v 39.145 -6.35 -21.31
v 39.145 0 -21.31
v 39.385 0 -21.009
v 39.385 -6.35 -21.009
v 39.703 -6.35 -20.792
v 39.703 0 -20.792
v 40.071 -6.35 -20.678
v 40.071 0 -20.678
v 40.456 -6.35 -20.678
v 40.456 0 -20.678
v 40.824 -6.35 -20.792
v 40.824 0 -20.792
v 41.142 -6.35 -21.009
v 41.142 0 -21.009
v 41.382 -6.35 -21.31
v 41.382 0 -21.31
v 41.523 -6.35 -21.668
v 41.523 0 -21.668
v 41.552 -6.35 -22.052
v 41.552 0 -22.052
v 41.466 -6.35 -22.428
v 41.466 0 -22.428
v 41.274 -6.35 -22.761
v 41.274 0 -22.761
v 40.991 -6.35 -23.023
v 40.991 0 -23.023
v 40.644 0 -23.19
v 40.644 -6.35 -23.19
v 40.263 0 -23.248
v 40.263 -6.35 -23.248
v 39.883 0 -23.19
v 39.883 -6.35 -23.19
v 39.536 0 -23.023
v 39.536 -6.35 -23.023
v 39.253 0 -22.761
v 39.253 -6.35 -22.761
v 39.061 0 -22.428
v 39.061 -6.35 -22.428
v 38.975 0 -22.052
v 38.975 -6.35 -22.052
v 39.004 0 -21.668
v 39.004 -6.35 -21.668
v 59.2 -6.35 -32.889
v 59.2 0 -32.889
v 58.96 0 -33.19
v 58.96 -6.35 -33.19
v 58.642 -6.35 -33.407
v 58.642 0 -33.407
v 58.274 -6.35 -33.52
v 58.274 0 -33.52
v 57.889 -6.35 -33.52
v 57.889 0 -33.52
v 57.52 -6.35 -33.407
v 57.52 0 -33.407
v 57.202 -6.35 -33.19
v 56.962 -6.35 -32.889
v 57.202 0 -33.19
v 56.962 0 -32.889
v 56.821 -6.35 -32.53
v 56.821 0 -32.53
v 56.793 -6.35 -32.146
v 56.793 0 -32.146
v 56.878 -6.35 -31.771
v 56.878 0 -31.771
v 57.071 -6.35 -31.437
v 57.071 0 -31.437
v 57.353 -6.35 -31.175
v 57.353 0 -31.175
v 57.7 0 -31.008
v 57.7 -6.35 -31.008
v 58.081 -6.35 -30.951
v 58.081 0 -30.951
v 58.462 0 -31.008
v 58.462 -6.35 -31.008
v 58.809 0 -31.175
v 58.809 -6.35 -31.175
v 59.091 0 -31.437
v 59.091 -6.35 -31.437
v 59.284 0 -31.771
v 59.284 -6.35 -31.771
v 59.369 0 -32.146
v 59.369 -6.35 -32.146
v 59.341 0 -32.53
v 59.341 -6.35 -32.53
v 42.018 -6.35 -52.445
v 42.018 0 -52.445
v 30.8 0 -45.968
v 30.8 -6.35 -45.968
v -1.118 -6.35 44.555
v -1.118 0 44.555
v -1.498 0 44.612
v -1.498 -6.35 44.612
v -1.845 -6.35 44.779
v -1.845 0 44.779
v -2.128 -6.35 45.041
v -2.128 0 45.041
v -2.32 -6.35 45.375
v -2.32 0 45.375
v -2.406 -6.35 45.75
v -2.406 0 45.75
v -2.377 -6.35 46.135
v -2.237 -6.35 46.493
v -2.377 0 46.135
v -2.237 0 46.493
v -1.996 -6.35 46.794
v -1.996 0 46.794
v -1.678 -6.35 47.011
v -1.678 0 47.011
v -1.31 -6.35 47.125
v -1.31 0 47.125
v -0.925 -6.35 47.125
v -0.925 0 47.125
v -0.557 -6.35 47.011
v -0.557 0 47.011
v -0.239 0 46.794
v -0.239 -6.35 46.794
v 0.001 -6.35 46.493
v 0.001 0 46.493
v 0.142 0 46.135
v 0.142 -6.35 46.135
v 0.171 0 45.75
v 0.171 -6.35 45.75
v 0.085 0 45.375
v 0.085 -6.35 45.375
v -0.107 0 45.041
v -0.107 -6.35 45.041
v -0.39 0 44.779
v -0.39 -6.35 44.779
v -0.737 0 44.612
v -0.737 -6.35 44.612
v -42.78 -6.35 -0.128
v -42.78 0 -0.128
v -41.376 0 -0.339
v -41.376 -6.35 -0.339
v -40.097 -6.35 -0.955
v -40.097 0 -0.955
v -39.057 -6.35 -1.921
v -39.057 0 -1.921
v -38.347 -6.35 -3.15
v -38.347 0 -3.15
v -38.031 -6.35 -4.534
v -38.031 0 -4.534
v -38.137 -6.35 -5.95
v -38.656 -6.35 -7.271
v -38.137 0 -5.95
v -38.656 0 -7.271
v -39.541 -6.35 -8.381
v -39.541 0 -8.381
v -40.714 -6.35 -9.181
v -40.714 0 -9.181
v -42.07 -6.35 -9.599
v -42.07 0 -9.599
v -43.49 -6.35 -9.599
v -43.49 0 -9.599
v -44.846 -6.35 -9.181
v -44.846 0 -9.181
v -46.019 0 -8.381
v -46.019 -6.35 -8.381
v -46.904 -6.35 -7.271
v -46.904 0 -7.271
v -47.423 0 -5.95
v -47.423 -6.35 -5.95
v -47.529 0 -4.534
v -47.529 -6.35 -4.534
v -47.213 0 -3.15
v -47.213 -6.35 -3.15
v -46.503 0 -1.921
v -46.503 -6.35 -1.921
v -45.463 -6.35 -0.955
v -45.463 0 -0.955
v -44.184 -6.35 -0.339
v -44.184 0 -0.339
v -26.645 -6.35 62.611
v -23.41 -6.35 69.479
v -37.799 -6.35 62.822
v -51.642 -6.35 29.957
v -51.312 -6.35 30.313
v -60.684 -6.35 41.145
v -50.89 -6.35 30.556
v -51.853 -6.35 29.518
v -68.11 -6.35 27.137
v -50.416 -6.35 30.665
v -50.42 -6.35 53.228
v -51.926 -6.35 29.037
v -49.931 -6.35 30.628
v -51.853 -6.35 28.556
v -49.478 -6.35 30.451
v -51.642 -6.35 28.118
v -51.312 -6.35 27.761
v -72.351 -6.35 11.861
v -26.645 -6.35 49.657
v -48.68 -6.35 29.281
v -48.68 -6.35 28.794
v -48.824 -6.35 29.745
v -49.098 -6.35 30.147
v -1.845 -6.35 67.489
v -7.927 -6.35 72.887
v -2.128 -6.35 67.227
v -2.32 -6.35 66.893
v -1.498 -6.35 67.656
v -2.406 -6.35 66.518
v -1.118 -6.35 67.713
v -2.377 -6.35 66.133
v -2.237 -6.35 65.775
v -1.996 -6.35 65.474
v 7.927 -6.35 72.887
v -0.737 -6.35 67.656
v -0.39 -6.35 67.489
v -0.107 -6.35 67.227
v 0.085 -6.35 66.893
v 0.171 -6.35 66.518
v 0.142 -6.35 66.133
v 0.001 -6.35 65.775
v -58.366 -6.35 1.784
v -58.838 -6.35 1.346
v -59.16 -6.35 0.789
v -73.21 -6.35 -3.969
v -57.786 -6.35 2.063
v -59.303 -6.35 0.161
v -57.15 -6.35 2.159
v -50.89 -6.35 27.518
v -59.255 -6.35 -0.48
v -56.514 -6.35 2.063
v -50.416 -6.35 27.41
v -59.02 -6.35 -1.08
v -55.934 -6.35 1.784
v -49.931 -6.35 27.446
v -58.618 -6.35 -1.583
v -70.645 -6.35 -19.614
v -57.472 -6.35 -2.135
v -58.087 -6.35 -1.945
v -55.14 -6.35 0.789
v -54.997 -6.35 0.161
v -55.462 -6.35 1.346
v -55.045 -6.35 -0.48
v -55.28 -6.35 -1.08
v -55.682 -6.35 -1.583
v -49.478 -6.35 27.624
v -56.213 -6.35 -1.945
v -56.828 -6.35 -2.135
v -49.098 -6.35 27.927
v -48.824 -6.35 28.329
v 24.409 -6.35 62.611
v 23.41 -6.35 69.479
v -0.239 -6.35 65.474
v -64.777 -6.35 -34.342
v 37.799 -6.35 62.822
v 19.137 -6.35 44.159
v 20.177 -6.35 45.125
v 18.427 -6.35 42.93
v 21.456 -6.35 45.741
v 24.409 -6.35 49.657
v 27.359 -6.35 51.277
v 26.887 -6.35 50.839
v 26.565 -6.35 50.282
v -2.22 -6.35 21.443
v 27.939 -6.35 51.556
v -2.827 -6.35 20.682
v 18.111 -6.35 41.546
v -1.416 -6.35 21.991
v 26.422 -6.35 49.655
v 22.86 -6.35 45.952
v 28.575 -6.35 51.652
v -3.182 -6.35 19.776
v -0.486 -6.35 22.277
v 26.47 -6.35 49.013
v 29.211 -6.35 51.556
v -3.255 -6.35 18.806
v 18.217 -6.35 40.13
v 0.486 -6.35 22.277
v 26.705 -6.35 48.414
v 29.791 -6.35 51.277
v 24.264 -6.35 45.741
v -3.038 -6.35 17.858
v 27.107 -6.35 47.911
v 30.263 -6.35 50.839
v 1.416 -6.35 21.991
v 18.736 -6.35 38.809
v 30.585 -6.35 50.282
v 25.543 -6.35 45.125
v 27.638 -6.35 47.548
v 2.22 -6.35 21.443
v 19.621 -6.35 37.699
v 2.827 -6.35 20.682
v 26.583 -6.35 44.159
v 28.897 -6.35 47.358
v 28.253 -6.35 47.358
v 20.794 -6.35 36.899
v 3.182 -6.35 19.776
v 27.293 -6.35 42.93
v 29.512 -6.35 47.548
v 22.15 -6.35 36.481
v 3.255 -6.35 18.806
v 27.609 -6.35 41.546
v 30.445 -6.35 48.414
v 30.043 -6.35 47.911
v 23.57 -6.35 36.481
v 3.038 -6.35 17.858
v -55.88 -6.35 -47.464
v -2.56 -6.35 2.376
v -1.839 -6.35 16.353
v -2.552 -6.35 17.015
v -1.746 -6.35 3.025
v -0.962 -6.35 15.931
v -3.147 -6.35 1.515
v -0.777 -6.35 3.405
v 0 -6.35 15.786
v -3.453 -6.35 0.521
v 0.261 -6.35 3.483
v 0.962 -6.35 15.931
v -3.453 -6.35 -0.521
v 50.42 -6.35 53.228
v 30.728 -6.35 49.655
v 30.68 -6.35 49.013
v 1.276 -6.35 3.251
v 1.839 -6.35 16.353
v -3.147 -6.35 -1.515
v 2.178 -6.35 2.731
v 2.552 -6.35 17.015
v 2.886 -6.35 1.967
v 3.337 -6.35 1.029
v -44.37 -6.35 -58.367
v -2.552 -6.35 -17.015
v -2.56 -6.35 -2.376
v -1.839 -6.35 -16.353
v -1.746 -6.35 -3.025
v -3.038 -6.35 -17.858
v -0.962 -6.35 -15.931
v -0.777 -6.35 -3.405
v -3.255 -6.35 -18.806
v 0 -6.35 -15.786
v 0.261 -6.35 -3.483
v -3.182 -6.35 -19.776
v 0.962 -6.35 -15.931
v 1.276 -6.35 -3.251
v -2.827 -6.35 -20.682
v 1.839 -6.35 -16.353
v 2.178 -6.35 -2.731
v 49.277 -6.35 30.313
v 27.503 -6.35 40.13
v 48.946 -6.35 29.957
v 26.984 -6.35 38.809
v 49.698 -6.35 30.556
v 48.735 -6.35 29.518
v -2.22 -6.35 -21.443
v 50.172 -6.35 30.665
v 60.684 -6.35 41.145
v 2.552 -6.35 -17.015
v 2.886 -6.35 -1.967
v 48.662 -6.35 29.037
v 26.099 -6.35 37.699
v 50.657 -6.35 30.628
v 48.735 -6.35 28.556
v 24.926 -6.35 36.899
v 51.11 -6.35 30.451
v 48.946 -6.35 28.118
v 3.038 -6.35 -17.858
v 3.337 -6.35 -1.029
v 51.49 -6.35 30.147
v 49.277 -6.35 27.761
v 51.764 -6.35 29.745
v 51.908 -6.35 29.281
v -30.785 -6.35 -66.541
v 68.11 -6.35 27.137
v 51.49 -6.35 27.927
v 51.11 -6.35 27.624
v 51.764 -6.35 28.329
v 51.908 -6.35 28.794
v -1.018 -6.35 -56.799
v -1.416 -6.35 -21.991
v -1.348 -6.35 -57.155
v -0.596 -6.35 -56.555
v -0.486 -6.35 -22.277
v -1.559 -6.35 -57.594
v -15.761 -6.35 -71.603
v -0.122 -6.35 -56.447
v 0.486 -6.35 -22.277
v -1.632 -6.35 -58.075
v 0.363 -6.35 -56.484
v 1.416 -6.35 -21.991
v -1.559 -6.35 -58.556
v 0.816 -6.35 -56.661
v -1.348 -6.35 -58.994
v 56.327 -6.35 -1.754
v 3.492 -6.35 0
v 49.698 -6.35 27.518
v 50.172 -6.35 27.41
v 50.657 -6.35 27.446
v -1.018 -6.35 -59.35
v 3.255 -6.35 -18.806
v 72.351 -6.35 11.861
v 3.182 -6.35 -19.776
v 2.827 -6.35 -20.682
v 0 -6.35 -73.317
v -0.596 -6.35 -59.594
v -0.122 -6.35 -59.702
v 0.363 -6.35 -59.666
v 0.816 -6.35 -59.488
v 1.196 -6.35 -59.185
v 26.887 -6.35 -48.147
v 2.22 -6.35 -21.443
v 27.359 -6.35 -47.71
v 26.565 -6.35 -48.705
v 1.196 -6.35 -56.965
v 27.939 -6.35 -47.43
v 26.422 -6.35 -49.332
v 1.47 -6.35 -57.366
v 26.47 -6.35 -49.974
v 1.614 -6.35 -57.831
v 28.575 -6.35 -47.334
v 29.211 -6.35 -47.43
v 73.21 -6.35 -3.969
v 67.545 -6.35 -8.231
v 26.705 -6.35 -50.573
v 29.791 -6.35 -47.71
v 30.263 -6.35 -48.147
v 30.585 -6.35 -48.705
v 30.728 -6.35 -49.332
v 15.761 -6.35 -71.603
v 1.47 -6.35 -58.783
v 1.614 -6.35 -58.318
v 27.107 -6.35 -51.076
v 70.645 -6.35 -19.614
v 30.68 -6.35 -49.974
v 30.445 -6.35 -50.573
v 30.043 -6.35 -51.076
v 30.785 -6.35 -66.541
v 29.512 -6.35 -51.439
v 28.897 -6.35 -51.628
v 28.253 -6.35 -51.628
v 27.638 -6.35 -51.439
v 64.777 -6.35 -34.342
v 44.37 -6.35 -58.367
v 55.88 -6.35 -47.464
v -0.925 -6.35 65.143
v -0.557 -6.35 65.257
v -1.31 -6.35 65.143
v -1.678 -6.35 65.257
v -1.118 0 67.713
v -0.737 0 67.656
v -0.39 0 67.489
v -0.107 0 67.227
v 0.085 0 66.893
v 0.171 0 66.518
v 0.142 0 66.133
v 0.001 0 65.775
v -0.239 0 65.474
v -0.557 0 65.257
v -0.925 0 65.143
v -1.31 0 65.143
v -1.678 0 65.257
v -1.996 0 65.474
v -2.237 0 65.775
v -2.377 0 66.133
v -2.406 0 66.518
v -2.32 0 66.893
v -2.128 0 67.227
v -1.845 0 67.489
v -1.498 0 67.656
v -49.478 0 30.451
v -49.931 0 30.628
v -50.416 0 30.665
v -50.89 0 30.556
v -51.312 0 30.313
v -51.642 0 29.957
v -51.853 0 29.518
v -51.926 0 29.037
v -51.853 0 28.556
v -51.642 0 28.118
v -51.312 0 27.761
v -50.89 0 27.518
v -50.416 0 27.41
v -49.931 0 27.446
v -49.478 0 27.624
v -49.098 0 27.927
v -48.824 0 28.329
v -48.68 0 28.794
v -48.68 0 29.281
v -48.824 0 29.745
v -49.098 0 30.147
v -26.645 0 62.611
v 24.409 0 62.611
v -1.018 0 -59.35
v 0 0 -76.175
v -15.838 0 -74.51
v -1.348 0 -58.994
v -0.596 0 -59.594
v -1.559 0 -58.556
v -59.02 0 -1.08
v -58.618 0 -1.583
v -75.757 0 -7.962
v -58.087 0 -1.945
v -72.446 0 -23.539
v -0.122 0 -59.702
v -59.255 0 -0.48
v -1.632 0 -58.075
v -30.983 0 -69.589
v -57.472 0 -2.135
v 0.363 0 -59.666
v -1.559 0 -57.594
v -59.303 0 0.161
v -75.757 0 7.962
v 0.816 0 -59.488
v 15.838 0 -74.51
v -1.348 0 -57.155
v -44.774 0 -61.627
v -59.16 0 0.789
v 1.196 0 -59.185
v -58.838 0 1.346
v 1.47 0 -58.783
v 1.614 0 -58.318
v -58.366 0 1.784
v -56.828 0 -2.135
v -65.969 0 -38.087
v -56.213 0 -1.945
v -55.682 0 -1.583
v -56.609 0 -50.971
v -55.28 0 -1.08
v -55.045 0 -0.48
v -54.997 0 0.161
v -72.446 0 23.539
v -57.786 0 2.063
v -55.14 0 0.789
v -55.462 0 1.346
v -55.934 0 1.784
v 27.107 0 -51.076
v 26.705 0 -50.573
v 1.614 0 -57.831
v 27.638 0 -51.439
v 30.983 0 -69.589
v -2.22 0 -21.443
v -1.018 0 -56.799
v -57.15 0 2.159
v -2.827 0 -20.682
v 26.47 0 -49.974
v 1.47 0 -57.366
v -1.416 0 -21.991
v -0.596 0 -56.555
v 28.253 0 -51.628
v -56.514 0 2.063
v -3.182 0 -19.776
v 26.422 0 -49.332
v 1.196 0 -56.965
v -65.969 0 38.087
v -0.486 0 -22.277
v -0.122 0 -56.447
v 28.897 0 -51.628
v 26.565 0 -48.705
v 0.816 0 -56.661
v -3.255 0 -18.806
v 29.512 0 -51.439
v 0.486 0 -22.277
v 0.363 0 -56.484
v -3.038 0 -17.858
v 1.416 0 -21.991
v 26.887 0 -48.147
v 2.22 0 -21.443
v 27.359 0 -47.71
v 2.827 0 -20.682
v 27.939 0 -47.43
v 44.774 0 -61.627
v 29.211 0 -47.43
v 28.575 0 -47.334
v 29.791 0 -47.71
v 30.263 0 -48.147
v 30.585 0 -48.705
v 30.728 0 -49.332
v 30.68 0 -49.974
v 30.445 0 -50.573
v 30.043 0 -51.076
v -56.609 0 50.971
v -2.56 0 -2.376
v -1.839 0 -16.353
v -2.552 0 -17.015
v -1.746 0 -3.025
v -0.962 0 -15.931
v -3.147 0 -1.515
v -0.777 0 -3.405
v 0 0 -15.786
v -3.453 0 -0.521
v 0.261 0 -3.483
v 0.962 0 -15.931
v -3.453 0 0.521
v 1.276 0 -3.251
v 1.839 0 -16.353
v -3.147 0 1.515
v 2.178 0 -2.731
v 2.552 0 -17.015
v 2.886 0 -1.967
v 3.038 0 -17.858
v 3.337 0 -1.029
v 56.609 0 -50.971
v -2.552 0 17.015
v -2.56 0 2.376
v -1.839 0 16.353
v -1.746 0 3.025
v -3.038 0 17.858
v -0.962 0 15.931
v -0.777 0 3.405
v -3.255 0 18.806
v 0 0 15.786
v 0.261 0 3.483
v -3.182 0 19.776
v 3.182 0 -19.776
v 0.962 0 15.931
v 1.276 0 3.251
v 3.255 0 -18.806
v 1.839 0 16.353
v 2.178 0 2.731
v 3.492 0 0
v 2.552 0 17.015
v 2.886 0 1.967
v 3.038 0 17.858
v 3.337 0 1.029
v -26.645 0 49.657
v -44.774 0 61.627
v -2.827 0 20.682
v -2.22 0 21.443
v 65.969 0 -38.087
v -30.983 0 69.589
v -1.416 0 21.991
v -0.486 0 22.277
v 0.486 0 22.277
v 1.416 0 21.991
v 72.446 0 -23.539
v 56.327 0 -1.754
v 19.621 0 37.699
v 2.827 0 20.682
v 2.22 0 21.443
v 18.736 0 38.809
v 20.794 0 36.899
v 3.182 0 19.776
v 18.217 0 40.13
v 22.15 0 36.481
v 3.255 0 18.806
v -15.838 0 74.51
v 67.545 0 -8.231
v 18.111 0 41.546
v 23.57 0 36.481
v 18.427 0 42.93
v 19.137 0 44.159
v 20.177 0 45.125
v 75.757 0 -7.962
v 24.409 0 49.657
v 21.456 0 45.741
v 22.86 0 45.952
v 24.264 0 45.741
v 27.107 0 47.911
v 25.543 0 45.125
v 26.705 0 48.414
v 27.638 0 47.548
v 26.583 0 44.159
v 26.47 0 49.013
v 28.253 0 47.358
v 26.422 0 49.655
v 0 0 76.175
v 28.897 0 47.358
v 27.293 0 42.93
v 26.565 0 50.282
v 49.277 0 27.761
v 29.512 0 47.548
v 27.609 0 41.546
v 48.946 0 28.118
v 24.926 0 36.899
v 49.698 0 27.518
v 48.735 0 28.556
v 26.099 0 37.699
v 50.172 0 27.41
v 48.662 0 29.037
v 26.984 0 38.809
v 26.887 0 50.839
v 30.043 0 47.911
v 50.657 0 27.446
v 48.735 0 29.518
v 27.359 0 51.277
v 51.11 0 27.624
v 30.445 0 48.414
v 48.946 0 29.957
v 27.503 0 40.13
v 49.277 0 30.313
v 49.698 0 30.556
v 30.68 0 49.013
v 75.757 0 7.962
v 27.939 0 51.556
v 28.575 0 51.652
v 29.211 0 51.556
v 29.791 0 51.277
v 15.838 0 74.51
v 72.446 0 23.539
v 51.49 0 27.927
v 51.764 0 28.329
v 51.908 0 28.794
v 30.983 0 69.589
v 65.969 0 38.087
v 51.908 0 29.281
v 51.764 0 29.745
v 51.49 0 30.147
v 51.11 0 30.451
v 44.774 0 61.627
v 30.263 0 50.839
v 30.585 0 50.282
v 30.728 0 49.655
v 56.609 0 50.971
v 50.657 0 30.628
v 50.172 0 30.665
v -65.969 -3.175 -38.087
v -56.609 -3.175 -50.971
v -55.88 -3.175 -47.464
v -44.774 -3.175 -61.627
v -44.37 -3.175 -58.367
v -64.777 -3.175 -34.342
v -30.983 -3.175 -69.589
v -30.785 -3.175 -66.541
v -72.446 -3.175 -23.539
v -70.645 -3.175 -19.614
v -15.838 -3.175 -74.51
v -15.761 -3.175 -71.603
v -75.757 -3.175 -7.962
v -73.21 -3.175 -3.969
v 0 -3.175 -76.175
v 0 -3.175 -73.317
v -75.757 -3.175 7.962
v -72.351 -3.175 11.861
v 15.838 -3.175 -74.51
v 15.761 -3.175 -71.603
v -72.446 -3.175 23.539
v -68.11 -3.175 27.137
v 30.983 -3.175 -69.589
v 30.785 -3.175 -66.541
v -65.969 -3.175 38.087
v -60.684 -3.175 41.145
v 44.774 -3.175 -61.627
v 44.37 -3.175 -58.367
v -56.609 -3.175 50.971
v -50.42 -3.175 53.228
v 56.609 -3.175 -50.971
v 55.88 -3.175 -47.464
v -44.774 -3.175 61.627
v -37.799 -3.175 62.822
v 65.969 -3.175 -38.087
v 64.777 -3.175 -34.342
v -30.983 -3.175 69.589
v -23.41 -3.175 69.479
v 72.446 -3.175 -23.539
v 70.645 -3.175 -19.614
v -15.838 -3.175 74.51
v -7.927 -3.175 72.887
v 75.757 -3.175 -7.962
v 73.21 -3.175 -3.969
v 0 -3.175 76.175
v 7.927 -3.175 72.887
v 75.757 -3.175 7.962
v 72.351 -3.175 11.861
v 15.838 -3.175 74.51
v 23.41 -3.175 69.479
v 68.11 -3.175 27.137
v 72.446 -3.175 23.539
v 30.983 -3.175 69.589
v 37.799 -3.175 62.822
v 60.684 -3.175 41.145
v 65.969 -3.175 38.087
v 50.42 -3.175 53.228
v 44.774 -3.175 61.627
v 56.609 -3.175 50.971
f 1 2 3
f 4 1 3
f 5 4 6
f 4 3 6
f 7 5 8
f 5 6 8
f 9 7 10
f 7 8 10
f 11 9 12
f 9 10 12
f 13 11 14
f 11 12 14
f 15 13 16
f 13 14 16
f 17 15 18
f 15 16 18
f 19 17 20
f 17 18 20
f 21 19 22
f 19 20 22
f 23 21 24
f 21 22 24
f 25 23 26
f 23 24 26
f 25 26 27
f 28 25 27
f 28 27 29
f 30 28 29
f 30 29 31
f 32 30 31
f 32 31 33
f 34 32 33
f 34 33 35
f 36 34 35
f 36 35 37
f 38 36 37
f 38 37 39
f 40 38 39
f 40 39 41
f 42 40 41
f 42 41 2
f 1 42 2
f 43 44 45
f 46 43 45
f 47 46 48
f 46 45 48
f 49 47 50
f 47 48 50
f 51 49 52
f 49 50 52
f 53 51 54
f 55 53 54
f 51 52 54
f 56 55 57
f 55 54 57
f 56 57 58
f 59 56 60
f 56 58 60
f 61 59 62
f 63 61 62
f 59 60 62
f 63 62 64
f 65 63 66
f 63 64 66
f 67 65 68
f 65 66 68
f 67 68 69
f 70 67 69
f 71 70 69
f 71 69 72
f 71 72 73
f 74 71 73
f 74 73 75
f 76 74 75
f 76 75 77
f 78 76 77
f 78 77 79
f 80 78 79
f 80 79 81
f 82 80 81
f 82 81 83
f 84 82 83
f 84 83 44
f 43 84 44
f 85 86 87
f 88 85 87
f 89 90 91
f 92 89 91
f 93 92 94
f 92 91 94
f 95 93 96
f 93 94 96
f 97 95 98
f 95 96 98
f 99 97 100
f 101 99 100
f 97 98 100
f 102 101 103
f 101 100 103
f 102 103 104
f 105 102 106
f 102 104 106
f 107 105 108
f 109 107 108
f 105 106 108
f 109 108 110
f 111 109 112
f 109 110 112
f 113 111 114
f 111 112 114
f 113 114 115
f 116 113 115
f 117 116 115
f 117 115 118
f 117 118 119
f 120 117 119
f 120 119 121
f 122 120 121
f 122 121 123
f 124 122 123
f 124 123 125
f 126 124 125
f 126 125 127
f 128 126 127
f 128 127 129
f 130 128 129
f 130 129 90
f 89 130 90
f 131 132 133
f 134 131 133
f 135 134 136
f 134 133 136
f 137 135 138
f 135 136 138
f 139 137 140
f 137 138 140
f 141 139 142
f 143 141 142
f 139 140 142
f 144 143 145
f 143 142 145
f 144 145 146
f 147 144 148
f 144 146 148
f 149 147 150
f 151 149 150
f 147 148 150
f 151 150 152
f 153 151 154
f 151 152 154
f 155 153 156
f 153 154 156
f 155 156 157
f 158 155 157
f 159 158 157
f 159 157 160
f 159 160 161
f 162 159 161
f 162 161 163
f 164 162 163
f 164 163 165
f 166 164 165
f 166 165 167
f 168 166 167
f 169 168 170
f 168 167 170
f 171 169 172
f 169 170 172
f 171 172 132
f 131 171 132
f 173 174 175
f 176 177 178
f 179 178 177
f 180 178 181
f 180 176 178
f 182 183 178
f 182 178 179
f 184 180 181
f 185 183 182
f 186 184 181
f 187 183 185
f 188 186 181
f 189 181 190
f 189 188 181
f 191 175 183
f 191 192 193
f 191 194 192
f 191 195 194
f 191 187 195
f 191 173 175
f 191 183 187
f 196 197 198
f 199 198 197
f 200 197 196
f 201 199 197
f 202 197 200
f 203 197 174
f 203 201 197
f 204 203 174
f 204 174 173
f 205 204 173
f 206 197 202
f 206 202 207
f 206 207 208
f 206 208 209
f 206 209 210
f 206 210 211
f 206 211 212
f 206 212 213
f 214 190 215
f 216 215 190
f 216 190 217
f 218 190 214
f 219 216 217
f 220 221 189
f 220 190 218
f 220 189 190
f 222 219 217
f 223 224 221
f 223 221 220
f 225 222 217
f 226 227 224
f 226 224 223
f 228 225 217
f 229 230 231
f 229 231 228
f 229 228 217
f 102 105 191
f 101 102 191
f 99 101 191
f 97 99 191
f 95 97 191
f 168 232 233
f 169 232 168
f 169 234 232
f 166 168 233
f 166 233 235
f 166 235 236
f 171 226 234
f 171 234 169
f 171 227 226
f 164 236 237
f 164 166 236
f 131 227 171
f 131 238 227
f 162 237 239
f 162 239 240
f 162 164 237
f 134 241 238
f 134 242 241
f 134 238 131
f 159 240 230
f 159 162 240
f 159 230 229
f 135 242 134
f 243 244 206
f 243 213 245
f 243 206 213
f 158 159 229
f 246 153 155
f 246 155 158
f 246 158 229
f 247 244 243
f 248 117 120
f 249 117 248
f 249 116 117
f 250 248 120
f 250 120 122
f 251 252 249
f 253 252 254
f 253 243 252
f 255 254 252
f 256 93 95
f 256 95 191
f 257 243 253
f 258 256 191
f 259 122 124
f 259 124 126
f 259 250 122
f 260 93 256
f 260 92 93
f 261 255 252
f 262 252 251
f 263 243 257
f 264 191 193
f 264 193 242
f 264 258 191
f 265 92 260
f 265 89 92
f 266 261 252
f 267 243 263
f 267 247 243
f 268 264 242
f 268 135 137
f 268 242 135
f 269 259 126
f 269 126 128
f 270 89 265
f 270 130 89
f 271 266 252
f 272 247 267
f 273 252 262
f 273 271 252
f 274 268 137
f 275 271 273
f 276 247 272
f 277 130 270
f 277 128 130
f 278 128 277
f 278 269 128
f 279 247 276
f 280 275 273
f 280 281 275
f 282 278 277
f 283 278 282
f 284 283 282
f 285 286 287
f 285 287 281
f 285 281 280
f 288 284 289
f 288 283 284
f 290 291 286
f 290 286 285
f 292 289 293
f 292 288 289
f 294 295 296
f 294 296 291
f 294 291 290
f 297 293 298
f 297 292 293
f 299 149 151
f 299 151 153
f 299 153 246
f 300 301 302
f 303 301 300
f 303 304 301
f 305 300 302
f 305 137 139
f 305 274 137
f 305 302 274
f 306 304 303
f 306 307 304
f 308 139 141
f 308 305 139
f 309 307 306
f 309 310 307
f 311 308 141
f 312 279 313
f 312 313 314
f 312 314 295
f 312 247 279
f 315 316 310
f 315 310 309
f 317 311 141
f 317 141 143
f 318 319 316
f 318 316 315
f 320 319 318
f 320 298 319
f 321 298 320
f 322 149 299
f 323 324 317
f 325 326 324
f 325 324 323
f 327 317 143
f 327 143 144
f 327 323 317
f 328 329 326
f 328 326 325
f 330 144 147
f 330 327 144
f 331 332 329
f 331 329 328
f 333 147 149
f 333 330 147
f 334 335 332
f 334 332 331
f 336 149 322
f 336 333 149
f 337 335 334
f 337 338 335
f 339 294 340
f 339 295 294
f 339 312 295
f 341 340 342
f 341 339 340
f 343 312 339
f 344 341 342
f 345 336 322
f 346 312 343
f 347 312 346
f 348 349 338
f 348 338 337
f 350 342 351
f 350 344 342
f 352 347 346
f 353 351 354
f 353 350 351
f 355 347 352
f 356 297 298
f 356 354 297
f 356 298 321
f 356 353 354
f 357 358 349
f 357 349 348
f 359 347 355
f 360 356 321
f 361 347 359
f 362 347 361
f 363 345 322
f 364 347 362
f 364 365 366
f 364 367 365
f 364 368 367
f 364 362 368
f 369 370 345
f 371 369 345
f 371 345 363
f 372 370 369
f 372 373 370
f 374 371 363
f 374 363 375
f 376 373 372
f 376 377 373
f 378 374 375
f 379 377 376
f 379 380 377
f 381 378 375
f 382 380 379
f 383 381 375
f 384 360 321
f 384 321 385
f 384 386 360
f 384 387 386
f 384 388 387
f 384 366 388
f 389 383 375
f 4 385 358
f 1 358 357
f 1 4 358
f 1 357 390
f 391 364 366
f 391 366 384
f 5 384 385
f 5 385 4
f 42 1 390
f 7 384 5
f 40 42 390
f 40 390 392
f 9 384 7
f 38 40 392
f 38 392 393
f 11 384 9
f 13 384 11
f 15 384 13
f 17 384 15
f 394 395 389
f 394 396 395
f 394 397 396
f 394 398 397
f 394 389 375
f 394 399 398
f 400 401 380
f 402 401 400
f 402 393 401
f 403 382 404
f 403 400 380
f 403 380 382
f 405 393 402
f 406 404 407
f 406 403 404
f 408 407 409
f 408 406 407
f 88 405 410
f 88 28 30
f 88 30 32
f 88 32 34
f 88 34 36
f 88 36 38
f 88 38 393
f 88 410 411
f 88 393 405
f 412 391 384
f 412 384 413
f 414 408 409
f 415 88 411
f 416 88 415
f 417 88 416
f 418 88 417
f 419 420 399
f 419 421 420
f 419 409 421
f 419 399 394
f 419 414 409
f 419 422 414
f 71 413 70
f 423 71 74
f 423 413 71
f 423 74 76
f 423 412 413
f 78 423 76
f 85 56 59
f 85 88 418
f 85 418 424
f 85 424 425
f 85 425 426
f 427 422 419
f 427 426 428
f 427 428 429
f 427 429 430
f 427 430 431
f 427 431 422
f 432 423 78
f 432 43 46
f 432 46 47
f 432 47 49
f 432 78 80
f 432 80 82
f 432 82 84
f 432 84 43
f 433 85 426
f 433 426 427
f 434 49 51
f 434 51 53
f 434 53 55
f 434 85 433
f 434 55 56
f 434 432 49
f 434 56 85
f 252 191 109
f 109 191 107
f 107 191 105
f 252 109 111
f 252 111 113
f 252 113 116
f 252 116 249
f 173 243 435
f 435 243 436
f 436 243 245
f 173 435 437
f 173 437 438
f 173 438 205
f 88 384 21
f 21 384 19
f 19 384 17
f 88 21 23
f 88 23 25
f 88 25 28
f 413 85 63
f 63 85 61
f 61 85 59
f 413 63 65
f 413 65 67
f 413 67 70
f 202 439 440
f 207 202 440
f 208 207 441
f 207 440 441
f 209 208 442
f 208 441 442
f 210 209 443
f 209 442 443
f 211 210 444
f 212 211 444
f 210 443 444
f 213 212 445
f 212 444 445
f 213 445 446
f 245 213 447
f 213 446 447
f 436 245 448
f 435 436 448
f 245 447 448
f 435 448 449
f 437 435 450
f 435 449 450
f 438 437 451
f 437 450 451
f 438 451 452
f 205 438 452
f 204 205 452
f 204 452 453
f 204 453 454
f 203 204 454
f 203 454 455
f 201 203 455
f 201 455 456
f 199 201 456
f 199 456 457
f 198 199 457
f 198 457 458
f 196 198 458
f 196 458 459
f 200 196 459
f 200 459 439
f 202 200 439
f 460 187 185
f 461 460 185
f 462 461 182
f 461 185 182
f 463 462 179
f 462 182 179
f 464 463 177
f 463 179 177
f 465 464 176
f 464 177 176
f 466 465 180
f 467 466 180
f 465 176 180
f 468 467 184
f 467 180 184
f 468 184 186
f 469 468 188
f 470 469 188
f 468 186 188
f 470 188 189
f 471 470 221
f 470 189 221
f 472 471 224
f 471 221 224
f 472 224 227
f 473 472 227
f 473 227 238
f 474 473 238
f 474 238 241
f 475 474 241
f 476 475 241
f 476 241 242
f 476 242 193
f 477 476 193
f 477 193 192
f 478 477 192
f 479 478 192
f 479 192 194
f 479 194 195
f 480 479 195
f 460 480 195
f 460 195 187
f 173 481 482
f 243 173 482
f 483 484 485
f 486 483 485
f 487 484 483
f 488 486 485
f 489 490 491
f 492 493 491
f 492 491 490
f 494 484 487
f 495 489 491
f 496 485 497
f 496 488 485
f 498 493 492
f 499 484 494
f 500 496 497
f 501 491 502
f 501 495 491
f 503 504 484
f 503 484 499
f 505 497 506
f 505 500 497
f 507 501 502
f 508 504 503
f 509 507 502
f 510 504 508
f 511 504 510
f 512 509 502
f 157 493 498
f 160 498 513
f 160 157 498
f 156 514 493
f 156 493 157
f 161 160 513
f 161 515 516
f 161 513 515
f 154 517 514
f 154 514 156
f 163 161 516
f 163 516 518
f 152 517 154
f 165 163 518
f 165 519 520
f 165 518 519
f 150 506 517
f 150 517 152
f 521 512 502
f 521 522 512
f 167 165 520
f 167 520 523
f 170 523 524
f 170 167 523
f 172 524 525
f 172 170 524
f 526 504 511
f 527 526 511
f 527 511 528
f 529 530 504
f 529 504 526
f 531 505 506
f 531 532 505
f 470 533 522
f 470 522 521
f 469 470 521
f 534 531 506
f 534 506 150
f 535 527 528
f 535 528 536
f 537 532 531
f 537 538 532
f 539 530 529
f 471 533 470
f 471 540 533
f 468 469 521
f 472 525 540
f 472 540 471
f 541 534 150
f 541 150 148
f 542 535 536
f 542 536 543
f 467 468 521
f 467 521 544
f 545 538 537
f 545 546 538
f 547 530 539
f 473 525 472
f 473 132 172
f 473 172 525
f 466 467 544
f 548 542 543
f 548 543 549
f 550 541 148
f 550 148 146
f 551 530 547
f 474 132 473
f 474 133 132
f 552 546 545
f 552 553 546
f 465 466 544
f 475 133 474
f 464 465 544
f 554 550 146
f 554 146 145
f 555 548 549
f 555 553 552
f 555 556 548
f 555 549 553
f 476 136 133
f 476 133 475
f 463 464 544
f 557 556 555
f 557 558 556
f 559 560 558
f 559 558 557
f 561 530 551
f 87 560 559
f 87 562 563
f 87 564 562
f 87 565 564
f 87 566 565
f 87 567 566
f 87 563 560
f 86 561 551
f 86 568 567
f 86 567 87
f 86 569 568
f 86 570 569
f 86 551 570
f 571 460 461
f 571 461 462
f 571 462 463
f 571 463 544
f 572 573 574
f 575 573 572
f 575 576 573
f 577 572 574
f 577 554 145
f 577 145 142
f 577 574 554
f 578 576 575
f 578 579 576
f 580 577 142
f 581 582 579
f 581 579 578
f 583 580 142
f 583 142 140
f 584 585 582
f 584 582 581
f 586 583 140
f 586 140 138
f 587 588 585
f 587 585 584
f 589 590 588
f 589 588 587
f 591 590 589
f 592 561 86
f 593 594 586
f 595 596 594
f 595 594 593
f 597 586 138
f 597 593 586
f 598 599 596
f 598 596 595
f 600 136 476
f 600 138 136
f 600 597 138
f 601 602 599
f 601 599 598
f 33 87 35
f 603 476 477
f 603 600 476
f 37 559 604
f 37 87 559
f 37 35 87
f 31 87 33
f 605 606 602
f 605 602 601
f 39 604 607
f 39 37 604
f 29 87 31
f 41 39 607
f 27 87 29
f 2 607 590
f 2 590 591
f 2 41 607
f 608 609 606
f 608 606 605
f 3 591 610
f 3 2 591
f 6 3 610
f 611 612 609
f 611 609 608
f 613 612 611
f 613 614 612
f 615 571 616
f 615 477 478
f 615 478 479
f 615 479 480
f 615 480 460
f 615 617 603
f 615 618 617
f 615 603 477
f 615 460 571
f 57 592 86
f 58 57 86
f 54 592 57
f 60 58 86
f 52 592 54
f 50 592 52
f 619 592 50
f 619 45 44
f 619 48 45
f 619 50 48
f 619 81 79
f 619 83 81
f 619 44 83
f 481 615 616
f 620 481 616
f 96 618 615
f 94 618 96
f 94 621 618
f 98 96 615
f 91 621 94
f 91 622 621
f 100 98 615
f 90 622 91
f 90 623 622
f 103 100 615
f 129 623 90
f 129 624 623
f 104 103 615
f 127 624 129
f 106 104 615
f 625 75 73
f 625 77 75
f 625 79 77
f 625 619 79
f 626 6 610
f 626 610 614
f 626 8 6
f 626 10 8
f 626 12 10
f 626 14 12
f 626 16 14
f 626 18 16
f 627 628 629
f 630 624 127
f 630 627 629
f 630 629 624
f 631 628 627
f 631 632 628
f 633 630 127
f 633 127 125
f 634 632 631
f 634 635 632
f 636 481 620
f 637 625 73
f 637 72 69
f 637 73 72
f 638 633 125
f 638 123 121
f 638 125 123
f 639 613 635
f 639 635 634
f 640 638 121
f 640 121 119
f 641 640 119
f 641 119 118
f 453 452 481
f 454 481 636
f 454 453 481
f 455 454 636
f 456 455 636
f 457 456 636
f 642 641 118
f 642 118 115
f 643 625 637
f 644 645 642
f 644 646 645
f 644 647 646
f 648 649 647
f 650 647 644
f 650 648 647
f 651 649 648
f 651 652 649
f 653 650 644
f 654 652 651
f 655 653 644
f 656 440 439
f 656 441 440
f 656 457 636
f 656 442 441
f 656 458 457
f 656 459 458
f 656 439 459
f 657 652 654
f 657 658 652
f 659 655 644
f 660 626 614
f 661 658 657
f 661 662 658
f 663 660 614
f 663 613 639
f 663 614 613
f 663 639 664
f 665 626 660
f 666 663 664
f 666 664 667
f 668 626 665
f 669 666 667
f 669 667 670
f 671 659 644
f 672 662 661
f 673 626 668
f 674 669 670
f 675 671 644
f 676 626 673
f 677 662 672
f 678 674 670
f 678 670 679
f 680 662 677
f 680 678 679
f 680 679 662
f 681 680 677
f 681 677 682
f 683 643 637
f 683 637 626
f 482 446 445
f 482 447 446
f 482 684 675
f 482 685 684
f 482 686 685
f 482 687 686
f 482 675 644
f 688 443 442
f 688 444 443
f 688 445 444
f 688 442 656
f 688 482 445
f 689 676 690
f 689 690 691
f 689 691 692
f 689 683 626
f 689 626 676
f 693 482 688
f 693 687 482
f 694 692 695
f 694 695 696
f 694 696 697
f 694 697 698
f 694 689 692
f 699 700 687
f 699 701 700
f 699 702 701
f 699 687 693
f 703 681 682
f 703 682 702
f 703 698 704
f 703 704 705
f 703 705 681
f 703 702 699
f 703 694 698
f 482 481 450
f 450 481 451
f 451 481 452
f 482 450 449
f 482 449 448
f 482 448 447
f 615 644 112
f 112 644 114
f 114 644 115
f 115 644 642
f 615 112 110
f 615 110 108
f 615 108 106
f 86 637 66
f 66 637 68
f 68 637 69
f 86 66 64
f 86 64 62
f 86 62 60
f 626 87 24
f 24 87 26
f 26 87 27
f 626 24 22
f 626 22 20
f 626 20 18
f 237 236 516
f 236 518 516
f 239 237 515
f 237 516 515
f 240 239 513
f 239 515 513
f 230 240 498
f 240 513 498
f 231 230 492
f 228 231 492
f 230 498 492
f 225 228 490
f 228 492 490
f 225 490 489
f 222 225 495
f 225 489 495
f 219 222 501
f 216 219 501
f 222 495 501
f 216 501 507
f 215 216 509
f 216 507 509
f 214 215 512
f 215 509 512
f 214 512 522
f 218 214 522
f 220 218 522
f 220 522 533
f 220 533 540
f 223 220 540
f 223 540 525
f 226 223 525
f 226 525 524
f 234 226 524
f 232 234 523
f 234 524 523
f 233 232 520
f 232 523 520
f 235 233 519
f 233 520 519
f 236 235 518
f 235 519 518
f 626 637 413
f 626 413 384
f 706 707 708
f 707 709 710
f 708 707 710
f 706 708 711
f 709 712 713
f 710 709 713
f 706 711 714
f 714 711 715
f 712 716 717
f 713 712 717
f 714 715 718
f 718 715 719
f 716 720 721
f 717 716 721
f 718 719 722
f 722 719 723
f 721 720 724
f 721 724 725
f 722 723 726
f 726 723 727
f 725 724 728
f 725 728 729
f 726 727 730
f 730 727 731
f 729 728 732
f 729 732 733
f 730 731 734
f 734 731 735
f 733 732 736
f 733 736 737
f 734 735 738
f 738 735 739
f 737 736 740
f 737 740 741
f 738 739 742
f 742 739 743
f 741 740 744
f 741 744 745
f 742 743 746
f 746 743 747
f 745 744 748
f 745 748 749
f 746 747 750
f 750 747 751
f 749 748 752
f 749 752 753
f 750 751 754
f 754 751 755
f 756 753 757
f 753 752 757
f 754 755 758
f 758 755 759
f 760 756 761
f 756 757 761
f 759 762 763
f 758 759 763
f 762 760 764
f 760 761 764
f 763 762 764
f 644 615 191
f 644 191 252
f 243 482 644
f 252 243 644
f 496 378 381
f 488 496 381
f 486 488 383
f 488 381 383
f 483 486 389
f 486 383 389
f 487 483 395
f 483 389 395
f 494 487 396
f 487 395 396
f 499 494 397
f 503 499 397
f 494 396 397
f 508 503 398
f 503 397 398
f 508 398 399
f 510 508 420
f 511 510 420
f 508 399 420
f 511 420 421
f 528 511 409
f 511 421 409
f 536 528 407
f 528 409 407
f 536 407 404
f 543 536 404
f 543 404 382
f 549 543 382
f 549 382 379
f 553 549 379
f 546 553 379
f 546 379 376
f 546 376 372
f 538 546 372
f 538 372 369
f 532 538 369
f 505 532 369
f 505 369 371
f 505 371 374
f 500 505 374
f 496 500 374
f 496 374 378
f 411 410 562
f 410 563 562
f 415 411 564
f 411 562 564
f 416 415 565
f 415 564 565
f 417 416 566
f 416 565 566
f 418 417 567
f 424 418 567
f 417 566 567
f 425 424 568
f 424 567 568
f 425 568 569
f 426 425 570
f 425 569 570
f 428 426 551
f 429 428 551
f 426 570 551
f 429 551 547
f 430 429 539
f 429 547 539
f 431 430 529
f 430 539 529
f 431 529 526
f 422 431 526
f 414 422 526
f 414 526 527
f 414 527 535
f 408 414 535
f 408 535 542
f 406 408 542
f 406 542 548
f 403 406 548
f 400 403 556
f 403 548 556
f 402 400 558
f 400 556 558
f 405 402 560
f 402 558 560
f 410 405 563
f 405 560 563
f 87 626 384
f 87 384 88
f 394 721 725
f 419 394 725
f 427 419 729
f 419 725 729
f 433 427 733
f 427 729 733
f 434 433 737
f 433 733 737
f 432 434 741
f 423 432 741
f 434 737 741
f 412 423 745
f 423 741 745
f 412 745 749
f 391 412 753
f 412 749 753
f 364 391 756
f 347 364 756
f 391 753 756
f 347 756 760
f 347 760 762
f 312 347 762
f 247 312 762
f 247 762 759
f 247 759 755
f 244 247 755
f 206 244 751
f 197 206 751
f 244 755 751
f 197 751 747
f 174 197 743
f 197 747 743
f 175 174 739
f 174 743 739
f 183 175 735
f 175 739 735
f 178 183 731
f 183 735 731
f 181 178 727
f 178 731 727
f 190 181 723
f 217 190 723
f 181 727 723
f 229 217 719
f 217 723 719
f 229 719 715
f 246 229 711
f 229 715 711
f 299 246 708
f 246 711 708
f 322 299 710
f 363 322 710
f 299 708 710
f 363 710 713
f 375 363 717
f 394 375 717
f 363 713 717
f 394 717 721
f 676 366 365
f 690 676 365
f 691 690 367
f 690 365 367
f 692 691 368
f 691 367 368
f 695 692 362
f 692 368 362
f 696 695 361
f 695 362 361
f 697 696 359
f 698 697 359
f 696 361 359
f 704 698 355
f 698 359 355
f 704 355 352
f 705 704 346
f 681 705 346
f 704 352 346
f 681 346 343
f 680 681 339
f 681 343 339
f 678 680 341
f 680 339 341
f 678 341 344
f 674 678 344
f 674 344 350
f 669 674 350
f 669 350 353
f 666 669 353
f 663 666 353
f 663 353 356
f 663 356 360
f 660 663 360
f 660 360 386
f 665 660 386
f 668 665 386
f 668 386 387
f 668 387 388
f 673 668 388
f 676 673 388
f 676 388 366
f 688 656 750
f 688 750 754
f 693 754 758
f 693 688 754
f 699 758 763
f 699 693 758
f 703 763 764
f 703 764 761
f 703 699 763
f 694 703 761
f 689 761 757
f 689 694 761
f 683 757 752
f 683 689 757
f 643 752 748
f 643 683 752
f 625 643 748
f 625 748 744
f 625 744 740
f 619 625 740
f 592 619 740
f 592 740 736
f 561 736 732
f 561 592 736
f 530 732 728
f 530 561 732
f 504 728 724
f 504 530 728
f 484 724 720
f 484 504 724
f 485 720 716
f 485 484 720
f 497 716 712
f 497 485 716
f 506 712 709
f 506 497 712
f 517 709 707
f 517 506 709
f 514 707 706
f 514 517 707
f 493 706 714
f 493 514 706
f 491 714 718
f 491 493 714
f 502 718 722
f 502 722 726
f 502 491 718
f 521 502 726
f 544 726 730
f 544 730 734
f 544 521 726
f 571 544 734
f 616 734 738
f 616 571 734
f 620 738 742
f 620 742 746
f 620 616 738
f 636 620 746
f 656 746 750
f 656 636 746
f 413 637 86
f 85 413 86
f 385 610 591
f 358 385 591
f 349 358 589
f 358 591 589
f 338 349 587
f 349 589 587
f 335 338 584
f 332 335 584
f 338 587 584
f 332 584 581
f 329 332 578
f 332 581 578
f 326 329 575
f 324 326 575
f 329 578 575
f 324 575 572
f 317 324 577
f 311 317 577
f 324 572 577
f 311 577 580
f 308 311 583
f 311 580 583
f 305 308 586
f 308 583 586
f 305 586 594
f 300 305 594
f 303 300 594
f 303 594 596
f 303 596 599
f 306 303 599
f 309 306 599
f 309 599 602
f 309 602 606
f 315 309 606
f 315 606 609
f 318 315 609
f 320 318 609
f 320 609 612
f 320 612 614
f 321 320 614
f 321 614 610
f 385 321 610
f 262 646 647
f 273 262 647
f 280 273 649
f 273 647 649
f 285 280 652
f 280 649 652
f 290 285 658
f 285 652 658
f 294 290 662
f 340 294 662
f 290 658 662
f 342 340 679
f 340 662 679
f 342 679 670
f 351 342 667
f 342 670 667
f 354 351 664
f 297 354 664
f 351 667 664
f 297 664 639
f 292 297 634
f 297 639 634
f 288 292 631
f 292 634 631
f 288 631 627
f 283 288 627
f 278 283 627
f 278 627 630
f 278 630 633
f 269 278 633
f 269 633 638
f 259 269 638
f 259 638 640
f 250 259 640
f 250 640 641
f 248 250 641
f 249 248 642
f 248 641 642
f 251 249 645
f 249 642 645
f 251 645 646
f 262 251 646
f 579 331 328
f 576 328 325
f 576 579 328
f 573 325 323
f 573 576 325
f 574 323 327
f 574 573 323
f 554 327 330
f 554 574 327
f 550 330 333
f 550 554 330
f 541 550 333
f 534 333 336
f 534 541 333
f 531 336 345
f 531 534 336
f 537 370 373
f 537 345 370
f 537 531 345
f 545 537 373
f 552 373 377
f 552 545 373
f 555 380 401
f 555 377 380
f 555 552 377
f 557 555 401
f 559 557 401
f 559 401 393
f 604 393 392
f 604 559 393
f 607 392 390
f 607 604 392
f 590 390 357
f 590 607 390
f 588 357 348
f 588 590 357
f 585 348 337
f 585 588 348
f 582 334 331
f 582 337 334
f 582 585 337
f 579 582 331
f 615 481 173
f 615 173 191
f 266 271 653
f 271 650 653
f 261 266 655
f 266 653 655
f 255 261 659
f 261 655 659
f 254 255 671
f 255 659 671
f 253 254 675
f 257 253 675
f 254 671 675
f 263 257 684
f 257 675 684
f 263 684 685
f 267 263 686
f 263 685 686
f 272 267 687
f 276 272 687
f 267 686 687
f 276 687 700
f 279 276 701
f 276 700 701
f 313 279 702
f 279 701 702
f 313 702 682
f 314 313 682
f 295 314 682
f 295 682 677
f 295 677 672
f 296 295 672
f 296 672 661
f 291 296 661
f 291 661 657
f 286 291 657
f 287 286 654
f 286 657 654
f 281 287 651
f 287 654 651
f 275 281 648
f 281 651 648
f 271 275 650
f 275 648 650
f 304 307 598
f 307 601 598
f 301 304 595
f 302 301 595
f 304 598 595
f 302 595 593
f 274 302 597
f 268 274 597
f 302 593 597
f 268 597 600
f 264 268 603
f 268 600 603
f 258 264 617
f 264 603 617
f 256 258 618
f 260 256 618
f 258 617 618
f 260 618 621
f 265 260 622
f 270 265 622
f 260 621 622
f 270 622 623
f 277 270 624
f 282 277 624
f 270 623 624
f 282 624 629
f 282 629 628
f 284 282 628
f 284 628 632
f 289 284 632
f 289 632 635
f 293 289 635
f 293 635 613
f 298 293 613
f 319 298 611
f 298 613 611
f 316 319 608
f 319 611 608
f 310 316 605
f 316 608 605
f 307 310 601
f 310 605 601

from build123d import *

# Parameters (mm, degrees)
SKETCH1_R                        = 76.1746
BOSS_EXTRUDE1_DEPTH              = 3.175
SKETCH3_R                        = 73.3171
BOSS_EXTRUDE2_DEPTH              = 3.175
F_97_0_0059_DIAMETER_HOLE1_D     = 6.985
F_97_0_0059_DIAMETER_HOLE1_DEPTH = 10.0076
F_97_0_0059_DIAMETER_HOLE1_TIP   = 2.016395815
SKETCH9_R                        = 1.292031205
SKETCH9_W                        = 51.054
SKETCH9_H                        = 12.954
CUT_EXTRUDE1_DEPTH               = 108.914141197
SKETCH11_R                       = 2.159
CUT_EXTRUDE3_DEPTH               = 108.914141197
CIRPATTERN2_COUNT                = 3
SKETCH15_R                       = 4.7625
CUT_EXTRUDE4_DEPTH               = 6.35
HOLE1_D                          = 3.2639
CIRPATTERN3_COUNT                = 3
CIRPATTERN3_ANGLE                = 240
CIRPATTERN4_COUNT                = 2
CIRPATTERN4_ANGLE                = 120


with BuildPart() as part:
    # Sketch1 → Boss-Extrude1 (new body)
    with BuildSketch(Plane(origin=(0, 0, 0), x_dir=(1, 0, 0), z_dir=(0, 1, 0))):
        with Locations(Location((0, 0, 0), (0, 0, 270))):
            Circle(SKETCH1_R)
    extrude(amount=-BOSS_EXTRUDE1_DEPTH)

    # Sketch3 → Boss-Extrude2 (add)
    with BuildSketch(Plane.XZ.offset(3.175)):
        with Locations(Location((0, 0, 0), (0, 0, 270))):
            Circle(SKETCH3_R)
    extrude(amount=BOSS_EXTRUDE2_DEPTH)

    # #97 (0.0059) Diameter Hole1
    with Locations(Plane(origin=(0, -6.35, 0), x_dir=(-1, 0, 0), z_dir=(0, -1, 0))):
        with Locations((0, 0)):
            Hole(F_97_0_0059_DIAMETER_HOLE1_D / 2, depth=F_97_0_0059_DIAMETER_HOLE1_DEPTH)
            with Locations((0, 0, -(F_97_0_0059_DIAMETER_HOLE1_DEPTH + F_97_0_0059_DIAMETER_HOLE1_TIP / 2))):  # 120° drill point
                Cone(0, F_97_0_0059_DIAMETER_HOLE1_D / 2, F_97_0_0059_DIAMETER_HOLE1_TIP, mode=Mode.SUBTRACT)

    # Sketch8 → #97 (0.0059) Diameter Hole3 (revolve, cut)
    with BuildSketch(Plane(origin=(0, 0, -19.05), x_dir=(0, 0, 1), z_dir=(1, 0, 0))):
        Polygon((0, 0), (0, 11.892013544), (3.2639, 10.0076), (3.2639, 0), align=None)
    f_97_0_0059_diameter_hole3 = revolve(axis=Axis((0, 6.35, -19.05), (0, -1, 0)), mode=Mode.SUBTRACT)

    # Mirror1: #97 (0.0059) Diameter Hole3 across plane
    add(f_97_0_0059_diameter_hole3.mirror(Plane.XY), mode=Mode.SUBTRACT)

    # Sketch9 → Cut-Extrude1 (cut, through all)
    with BuildSketch(Plane(origin=(0, 0, 0), x_dir=(1, 0, 0), z_dir=(0, 1, 0))):
        with Locations(Location((-1.1176, -66.421, 0), (0, 0, 270))):
            Circle(SKETCH9_R)
        with Locations(Location((-1.1176, -45.847, 0), (0, 0, 90))):
            Circle(SKETCH9_R)
        with Locations((-1.1176, -56.134)):
            Rectangle(SKETCH9_W, SKETCH9_H)
    cut_extrude1 = extrude(amount=-CUT_EXTRUDE1_DEPTH, mode=Mode.SUBTRACT)

    # Sketch11 → Cut-Extrude3 (cut, symmetric)
    with BuildSketch(Plane(origin=(0, 0, 0), x_dir=(1, 0, 0), z_dir=(0, 1, 0))):
        with Locations(Location((28.575, 49.493351826, 0), (0, 0, 270))):
            Circle(SKETCH11_R)
    cut_extrude3 = extrude(amount=CUT_EXTRUDE3_DEPTH, both=True, mode=Mode.SUBTRACT)

    # CirPattern2: Cut-Extrude3 ×3 about axis
    cirpattern2_axis = Axis((0, 0, 0), (0, 1, 0))
    for i in range(1, CIRPATTERN2_COUNT):
        add(cut_extrude3.rotate(cirpattern2_axis, i * 360 / CIRPATTERN2_COUNT), mode=Mode.SUBTRACT)

    # Sketch15 → Cut-Extrude4 (cut)
    with BuildSketch(Plane(origin=(0, 0, 0), x_dir=(1, 0, 0), z_dir=(0, 1, 0))):
        with Locations(Location((-42.7800008, 4.89000038, 0), (0, 0, 270))):
            Circle(SKETCH15_R)
        with Locations(Location((22.86, -41.1899989, 0), (0, 0, 270))):
            Circle(SKETCH15_R)
    extrude(amount=-CUT_EXTRUDE4_DEPTH, mode=Mode.SUBTRACT)

    # Hole1 (through all)
    with Locations(Plane(origin=(0, 0, 0), x_dir=(1, 0, 0), z_dir=(0, 1, 0))):
        with Locations((0, 58.07456)):
            hole1 = Hole(HOLE1_D / 2)

    # CirPattern3: Hole1 ×3 about axis
    cirpattern3_axis = Axis((0, 0, 0), (0, 1, 0))
    for i in range(1, CIRPATTERN3_COUNT):
        add(hole1.rotate(cirpattern3_axis, i * CIRPATTERN3_ANGLE / (CIRPATTERN3_COUNT - 1)), mode=Mode.SUBTRACT)

    # CirPattern4: Cut-Extrude1 ×2 about axis
    cirpattern4_axis = Axis((0, 0, 0), (0, 1, 0))
    for i in range(1, CIRPATTERN4_COUNT):
        add(cut_extrude1.rotate(cirpattern4_axis, i * CIRPATTERN4_ANGLE / (CIRPATTERN4_COUNT - 1)), mode=Mode.SUBTRACT)


solid = part.part
